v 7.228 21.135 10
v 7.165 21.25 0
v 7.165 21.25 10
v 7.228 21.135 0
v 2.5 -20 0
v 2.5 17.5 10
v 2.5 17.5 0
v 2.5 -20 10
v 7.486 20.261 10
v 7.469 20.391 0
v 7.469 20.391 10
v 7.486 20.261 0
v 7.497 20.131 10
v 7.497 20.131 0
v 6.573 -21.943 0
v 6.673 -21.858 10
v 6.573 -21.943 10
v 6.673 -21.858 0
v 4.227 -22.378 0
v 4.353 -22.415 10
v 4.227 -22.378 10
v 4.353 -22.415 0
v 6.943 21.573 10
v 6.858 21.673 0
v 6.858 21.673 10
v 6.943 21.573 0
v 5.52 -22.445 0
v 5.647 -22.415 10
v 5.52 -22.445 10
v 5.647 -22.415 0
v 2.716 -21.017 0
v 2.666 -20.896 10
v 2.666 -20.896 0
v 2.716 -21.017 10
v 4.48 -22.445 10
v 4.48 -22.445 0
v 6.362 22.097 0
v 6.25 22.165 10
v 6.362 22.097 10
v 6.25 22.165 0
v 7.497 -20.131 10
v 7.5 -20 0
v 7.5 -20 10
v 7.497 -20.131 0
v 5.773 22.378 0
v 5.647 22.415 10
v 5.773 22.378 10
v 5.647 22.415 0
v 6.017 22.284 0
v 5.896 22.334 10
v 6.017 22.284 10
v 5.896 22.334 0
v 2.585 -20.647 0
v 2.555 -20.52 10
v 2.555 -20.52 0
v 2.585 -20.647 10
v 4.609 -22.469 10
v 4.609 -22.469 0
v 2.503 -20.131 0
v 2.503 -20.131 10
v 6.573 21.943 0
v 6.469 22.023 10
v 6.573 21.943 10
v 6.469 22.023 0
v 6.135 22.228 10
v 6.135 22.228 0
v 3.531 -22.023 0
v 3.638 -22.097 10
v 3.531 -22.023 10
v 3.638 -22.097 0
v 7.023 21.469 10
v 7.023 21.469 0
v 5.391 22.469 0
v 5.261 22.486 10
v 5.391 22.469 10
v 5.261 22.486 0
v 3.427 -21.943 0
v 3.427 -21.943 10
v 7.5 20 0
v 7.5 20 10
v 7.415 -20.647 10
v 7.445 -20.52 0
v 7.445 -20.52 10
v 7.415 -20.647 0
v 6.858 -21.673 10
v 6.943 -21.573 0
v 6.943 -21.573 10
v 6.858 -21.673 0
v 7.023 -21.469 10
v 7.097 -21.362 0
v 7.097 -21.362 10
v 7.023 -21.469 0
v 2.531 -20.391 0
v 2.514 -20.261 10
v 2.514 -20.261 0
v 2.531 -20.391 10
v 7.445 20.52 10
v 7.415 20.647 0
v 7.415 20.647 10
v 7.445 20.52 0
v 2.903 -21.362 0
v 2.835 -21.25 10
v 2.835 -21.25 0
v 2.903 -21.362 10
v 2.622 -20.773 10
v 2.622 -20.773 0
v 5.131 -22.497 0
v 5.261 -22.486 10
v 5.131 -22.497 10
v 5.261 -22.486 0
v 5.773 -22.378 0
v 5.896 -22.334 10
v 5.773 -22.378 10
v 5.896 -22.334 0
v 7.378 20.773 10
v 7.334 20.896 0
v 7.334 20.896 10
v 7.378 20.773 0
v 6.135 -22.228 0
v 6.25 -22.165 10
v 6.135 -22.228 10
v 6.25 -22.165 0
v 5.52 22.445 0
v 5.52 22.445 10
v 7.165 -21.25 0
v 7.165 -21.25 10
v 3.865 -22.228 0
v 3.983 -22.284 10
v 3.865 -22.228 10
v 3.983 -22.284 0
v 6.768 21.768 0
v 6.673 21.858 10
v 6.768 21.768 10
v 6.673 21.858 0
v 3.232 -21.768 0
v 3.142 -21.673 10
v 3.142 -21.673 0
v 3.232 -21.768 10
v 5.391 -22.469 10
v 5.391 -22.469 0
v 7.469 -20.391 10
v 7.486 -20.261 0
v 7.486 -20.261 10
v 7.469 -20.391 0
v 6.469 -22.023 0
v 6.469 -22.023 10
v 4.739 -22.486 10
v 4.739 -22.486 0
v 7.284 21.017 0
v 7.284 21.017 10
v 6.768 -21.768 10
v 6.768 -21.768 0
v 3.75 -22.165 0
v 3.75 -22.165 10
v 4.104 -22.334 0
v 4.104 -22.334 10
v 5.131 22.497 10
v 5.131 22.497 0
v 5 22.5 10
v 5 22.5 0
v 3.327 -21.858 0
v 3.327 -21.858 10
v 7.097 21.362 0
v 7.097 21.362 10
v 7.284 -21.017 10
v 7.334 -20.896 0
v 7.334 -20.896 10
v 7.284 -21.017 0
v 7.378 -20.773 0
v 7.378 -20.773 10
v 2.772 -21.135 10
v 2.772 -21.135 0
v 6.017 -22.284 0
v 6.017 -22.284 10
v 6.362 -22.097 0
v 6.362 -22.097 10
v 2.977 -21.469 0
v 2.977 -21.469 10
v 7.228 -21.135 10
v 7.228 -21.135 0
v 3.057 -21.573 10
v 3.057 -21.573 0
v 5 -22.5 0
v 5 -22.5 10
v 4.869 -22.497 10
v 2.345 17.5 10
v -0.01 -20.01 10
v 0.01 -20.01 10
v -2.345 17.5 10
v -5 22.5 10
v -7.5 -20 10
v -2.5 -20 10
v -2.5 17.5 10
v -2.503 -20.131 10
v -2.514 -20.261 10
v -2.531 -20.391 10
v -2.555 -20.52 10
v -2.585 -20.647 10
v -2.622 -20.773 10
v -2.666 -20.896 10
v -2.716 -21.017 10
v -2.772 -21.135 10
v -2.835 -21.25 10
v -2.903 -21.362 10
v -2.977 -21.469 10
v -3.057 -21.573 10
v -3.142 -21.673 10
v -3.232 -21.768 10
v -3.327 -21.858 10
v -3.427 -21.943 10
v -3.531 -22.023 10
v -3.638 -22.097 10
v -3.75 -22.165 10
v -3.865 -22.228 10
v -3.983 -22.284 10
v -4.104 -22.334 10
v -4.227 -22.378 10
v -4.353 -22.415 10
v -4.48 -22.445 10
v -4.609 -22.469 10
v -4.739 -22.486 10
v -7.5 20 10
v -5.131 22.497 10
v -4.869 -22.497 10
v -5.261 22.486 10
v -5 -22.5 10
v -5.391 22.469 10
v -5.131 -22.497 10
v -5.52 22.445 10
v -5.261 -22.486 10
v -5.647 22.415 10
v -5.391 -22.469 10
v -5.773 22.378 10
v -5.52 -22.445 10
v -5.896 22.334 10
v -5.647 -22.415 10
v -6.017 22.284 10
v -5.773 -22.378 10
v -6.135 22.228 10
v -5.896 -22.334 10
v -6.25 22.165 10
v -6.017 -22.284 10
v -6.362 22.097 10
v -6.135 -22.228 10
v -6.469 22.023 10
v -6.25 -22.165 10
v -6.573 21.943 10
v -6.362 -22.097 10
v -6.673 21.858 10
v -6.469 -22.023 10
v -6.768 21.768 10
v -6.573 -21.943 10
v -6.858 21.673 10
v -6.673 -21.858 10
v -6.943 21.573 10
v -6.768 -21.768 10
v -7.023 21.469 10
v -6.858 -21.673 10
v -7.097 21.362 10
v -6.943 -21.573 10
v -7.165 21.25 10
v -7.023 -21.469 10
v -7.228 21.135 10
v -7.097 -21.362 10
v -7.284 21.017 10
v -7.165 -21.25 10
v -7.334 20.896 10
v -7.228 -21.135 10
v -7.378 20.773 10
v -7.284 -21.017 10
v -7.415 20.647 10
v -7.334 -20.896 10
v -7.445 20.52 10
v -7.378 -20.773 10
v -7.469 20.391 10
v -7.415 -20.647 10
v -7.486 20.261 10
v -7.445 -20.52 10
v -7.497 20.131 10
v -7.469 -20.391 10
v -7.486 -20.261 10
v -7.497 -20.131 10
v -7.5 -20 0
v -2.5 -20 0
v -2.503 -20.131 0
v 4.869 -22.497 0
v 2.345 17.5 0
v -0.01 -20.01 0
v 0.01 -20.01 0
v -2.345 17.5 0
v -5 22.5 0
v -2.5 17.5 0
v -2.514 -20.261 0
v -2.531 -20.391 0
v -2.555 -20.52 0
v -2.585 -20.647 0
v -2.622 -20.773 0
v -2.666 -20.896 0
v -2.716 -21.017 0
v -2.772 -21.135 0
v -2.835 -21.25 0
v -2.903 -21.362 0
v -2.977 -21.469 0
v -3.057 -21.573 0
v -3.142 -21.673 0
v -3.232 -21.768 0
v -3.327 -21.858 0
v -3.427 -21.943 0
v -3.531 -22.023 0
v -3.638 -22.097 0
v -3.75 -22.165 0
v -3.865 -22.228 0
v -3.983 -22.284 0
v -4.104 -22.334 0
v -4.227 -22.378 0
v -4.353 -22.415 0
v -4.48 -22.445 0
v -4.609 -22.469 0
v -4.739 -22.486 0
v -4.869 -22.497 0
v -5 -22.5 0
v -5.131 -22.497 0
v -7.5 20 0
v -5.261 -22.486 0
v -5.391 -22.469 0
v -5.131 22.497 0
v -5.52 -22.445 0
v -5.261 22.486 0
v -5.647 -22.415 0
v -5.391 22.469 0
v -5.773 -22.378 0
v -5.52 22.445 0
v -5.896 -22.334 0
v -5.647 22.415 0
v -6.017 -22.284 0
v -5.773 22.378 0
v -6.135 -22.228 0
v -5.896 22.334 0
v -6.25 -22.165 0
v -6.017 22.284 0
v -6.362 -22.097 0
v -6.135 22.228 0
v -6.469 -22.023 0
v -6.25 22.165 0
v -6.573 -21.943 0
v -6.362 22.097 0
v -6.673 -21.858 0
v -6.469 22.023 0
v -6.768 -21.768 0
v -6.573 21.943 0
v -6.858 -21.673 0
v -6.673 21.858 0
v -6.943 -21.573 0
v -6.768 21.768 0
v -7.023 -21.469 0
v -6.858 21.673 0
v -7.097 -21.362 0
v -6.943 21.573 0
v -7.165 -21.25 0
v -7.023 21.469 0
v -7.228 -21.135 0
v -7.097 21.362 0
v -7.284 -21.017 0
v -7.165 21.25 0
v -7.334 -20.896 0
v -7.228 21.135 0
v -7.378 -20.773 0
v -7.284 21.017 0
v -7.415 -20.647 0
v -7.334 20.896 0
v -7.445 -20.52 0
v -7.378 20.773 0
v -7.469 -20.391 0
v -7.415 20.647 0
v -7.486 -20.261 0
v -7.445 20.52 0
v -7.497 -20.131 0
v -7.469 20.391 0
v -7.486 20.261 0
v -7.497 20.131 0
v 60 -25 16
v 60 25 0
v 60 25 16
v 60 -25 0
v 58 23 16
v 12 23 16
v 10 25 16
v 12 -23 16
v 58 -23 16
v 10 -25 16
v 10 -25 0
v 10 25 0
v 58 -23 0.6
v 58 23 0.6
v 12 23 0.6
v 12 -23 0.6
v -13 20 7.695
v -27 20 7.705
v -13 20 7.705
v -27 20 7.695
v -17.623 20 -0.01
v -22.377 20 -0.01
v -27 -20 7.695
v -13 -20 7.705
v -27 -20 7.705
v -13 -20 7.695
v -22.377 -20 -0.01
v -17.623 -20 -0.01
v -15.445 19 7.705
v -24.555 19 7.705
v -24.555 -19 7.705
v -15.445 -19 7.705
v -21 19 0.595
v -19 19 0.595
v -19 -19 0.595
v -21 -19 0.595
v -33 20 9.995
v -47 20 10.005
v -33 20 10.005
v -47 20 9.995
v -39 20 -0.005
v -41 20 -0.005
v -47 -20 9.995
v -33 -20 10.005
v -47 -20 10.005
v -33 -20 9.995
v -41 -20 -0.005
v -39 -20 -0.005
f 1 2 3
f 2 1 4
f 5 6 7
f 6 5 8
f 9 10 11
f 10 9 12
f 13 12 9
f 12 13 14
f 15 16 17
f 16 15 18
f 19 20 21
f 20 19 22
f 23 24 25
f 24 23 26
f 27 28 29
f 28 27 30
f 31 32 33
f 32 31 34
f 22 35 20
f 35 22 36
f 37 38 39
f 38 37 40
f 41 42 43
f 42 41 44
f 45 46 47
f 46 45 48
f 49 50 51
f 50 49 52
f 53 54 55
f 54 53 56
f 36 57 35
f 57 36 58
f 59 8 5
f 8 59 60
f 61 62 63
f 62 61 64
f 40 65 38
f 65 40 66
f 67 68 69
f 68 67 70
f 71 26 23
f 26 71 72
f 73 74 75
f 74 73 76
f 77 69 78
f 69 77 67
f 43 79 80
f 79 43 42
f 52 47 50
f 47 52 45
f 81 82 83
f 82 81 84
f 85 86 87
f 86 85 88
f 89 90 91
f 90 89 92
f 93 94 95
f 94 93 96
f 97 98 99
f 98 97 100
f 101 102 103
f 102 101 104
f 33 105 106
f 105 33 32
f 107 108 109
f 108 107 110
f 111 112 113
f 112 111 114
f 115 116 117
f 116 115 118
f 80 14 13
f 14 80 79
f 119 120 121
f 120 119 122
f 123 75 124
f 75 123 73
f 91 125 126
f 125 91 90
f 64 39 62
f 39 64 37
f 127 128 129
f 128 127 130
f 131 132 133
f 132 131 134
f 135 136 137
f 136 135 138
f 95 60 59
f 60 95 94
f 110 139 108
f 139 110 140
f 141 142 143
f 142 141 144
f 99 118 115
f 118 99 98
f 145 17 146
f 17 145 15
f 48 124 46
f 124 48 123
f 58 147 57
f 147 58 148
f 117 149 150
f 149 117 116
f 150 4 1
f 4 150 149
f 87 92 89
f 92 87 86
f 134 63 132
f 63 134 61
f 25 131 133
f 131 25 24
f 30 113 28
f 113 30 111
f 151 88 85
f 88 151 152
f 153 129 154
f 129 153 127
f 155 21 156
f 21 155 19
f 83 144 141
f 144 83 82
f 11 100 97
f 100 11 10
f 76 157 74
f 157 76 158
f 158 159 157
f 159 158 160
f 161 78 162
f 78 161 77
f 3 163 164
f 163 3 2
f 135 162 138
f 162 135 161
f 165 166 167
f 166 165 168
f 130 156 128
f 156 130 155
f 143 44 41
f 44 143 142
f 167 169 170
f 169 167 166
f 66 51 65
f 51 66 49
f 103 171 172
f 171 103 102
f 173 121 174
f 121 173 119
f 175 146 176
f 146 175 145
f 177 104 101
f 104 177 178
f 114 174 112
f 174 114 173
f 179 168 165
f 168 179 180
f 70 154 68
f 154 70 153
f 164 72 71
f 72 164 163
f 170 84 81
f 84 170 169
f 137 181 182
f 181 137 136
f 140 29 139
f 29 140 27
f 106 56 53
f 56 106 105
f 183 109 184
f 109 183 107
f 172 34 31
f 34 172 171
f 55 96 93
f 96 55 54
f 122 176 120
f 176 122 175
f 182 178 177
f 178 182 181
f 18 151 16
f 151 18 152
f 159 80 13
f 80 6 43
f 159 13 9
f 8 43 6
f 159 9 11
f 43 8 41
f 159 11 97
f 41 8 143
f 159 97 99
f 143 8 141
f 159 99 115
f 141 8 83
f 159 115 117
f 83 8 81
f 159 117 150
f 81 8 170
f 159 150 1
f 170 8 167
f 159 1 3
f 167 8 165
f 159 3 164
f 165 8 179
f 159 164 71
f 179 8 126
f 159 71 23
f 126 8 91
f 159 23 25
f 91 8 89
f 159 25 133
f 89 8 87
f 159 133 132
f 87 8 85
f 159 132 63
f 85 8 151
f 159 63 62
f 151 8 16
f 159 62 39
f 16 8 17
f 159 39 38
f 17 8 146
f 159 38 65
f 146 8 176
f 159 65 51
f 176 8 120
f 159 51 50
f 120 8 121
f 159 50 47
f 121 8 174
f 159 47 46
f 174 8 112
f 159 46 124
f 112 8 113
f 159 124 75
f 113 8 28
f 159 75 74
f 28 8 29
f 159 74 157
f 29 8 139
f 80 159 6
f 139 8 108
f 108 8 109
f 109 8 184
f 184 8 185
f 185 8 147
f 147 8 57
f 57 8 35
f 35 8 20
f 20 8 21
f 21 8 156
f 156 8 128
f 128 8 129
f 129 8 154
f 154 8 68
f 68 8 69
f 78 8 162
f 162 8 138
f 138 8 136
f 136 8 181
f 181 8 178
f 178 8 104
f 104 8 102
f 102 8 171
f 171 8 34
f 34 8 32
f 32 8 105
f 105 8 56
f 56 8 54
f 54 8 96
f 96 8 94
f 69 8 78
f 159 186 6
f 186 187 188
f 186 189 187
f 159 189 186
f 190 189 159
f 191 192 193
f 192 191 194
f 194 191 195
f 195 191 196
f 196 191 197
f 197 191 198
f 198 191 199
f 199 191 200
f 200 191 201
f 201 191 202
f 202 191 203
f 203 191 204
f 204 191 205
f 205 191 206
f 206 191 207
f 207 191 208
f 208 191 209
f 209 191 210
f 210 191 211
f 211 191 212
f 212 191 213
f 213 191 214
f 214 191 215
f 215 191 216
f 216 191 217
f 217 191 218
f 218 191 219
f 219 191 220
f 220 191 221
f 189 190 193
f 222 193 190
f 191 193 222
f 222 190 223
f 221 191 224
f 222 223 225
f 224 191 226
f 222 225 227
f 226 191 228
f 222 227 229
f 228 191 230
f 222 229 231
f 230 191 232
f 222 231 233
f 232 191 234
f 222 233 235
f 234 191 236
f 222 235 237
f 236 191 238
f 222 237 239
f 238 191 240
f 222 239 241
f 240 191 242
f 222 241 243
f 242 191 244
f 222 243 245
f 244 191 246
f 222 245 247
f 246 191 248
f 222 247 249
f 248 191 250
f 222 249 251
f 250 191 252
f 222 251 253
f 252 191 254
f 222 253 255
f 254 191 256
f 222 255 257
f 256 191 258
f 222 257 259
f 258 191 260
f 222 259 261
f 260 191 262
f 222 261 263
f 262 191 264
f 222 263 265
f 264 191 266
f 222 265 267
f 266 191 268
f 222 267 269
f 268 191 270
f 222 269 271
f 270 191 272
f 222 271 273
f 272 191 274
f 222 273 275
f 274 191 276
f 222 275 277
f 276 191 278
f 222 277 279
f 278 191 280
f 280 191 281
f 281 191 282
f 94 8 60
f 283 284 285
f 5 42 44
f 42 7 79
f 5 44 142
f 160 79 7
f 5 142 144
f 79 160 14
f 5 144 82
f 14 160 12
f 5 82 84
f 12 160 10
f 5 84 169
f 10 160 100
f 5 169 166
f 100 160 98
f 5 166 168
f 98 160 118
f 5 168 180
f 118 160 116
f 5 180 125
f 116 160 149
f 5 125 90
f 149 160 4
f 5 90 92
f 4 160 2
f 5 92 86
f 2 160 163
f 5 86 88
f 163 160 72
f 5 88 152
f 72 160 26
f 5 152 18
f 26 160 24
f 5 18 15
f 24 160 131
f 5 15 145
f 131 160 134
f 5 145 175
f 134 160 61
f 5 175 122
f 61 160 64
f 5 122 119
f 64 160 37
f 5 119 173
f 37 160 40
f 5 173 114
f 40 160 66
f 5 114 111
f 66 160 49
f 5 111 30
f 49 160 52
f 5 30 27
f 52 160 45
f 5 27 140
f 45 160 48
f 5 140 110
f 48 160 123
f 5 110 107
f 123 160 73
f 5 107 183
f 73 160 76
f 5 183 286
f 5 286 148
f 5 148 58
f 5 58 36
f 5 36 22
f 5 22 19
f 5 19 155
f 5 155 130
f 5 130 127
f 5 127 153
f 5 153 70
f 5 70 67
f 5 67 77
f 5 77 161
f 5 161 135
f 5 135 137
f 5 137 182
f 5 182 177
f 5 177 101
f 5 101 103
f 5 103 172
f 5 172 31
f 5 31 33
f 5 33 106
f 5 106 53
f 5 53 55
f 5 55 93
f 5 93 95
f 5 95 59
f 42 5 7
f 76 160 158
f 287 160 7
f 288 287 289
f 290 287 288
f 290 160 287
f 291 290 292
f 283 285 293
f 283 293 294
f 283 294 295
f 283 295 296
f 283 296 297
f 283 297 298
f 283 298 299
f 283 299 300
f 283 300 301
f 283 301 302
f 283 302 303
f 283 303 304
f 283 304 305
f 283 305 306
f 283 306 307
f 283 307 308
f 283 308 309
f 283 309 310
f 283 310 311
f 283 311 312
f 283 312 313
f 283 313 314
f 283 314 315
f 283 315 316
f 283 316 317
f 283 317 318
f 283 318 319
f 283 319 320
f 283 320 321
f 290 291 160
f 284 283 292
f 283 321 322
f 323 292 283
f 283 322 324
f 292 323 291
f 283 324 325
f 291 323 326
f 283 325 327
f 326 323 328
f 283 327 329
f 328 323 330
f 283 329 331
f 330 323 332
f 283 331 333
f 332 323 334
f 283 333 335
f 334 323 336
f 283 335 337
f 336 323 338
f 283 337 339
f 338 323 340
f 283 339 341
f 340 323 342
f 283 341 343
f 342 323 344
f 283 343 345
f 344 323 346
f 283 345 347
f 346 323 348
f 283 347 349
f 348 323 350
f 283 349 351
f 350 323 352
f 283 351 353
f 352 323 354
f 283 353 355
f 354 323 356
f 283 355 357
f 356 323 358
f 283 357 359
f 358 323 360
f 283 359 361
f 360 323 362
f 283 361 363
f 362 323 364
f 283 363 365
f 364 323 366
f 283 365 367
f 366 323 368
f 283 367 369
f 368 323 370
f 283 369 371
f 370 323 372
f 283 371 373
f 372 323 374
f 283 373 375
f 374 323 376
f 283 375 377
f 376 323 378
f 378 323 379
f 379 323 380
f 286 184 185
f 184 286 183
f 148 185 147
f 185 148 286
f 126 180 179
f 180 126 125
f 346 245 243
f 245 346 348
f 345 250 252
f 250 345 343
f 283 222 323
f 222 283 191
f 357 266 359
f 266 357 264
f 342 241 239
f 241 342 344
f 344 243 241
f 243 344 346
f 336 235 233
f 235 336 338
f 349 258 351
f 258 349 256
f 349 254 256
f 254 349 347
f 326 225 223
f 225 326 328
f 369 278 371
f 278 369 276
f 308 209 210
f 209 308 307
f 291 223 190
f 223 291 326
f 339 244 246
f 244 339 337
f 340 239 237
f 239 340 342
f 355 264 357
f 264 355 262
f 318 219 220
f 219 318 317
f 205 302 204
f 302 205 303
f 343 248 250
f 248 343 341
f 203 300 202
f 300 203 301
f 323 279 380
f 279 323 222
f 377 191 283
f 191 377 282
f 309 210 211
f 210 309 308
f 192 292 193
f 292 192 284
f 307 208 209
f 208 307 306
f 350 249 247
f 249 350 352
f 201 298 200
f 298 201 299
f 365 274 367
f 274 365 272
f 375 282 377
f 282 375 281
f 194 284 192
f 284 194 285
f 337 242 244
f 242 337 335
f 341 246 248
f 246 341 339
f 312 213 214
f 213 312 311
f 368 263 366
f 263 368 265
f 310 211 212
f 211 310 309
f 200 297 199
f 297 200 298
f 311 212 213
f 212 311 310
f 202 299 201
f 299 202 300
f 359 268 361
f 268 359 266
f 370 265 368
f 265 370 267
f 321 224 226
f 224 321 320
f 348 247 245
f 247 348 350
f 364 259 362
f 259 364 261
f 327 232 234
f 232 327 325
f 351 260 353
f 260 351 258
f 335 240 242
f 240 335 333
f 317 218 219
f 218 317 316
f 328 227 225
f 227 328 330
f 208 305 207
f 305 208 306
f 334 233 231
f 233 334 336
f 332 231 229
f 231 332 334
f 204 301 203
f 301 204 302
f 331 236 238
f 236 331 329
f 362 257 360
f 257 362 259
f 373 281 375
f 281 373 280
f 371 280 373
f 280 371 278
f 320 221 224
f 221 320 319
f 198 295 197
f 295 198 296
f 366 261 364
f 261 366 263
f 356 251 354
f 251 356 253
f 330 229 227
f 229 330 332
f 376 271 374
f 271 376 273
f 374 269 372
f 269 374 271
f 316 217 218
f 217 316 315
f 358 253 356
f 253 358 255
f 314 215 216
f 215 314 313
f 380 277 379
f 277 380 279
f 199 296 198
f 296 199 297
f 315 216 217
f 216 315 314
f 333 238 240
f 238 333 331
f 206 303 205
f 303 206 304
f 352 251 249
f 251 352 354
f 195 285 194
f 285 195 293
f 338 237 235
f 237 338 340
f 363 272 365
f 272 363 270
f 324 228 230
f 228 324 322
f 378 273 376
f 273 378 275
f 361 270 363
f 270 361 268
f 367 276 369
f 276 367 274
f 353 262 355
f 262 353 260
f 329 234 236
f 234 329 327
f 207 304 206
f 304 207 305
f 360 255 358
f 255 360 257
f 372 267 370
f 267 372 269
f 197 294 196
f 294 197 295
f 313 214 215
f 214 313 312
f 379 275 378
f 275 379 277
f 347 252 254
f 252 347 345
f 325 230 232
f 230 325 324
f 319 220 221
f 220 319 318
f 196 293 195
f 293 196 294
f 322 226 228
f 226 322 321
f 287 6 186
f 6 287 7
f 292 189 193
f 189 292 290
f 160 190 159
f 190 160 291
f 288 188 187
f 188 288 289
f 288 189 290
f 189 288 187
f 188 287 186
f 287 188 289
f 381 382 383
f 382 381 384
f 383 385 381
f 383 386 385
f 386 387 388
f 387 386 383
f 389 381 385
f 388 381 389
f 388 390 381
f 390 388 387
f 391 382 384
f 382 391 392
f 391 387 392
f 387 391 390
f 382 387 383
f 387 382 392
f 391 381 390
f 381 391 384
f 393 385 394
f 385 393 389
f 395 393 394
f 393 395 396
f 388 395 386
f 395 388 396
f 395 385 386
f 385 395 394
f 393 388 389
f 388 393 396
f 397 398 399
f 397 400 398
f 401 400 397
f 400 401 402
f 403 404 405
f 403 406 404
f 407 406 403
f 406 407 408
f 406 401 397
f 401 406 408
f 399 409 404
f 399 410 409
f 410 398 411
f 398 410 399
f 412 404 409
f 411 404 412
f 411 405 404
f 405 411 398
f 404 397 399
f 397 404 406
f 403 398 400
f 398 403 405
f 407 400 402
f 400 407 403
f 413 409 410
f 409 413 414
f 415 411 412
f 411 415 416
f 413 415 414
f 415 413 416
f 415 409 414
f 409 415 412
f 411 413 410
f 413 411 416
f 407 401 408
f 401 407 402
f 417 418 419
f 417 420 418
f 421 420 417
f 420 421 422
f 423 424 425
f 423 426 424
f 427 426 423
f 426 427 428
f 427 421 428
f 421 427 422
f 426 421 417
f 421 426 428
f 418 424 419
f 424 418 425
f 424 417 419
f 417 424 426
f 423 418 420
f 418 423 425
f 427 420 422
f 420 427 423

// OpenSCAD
module wedge() {
    hull() {
        cube([2,40,0.01], center=true);
        translate([0,0,10]) cube([14,40,0.01], center=true);
    }
}

module hollow_wedge() {
    wall = 1;
    bottom = 0.6;
    offset=2.3;
    translate([0,0,-offset]) difference() {
        hull() {
            cube([2,40,0.01], center=true);
            translate([0,0,10]) cube([14,40,0.01], center=true);
        }
        translate([0,0,bottom+offset]) hull() {
            cube([2,40-wall*2,0.01], center=true);
            translate([0,0,10]) cube([14-wall*2,40-wall*2,0.01], center=true);
        }
        translate([-30,-30,-0.01]) cube([60,60,offset]);
    }
}

module tray() {
    wall = 2;
    bottom = 0.6;
    inner = 50 - wall*2;
    difference() {
        translate([-25,-25,0]) cube([50,50,16]);
        translate([-inner/2,-inner/2,bottom]) cube([inner,inner,16]);
    }
}

module point() {
    hull() {
        translate([-5,0,0]) cylinder(d=5,h=10);
        translate([-5,40,0]) cylinder(d=5,h=10);
    }
    hull() {
        translate([5,0,0]) cylinder(d=5,h=10);
        translate([5,40,0]) cylinder(d=5,h=10);
    }
    hull() {
        translate([-5,0,0]) cylinder(d=5,h=10);
        translate([5,0,0]) cylinder(d=5,h=10);
    }
    hull() {
        translate([-2.5,0,0]) cube([5,0.01,10]);
        translate([-0.01,40,0]) cube([0.02,0.01,10]);
    }
}

$fn=120;
translate([0,20,0]) rotate([0,0,180]) point();
translate([35,0,0]) tray();
translate([-40,0,0]) wedge();
translate([-20,0,0]) hollow_wedge();
